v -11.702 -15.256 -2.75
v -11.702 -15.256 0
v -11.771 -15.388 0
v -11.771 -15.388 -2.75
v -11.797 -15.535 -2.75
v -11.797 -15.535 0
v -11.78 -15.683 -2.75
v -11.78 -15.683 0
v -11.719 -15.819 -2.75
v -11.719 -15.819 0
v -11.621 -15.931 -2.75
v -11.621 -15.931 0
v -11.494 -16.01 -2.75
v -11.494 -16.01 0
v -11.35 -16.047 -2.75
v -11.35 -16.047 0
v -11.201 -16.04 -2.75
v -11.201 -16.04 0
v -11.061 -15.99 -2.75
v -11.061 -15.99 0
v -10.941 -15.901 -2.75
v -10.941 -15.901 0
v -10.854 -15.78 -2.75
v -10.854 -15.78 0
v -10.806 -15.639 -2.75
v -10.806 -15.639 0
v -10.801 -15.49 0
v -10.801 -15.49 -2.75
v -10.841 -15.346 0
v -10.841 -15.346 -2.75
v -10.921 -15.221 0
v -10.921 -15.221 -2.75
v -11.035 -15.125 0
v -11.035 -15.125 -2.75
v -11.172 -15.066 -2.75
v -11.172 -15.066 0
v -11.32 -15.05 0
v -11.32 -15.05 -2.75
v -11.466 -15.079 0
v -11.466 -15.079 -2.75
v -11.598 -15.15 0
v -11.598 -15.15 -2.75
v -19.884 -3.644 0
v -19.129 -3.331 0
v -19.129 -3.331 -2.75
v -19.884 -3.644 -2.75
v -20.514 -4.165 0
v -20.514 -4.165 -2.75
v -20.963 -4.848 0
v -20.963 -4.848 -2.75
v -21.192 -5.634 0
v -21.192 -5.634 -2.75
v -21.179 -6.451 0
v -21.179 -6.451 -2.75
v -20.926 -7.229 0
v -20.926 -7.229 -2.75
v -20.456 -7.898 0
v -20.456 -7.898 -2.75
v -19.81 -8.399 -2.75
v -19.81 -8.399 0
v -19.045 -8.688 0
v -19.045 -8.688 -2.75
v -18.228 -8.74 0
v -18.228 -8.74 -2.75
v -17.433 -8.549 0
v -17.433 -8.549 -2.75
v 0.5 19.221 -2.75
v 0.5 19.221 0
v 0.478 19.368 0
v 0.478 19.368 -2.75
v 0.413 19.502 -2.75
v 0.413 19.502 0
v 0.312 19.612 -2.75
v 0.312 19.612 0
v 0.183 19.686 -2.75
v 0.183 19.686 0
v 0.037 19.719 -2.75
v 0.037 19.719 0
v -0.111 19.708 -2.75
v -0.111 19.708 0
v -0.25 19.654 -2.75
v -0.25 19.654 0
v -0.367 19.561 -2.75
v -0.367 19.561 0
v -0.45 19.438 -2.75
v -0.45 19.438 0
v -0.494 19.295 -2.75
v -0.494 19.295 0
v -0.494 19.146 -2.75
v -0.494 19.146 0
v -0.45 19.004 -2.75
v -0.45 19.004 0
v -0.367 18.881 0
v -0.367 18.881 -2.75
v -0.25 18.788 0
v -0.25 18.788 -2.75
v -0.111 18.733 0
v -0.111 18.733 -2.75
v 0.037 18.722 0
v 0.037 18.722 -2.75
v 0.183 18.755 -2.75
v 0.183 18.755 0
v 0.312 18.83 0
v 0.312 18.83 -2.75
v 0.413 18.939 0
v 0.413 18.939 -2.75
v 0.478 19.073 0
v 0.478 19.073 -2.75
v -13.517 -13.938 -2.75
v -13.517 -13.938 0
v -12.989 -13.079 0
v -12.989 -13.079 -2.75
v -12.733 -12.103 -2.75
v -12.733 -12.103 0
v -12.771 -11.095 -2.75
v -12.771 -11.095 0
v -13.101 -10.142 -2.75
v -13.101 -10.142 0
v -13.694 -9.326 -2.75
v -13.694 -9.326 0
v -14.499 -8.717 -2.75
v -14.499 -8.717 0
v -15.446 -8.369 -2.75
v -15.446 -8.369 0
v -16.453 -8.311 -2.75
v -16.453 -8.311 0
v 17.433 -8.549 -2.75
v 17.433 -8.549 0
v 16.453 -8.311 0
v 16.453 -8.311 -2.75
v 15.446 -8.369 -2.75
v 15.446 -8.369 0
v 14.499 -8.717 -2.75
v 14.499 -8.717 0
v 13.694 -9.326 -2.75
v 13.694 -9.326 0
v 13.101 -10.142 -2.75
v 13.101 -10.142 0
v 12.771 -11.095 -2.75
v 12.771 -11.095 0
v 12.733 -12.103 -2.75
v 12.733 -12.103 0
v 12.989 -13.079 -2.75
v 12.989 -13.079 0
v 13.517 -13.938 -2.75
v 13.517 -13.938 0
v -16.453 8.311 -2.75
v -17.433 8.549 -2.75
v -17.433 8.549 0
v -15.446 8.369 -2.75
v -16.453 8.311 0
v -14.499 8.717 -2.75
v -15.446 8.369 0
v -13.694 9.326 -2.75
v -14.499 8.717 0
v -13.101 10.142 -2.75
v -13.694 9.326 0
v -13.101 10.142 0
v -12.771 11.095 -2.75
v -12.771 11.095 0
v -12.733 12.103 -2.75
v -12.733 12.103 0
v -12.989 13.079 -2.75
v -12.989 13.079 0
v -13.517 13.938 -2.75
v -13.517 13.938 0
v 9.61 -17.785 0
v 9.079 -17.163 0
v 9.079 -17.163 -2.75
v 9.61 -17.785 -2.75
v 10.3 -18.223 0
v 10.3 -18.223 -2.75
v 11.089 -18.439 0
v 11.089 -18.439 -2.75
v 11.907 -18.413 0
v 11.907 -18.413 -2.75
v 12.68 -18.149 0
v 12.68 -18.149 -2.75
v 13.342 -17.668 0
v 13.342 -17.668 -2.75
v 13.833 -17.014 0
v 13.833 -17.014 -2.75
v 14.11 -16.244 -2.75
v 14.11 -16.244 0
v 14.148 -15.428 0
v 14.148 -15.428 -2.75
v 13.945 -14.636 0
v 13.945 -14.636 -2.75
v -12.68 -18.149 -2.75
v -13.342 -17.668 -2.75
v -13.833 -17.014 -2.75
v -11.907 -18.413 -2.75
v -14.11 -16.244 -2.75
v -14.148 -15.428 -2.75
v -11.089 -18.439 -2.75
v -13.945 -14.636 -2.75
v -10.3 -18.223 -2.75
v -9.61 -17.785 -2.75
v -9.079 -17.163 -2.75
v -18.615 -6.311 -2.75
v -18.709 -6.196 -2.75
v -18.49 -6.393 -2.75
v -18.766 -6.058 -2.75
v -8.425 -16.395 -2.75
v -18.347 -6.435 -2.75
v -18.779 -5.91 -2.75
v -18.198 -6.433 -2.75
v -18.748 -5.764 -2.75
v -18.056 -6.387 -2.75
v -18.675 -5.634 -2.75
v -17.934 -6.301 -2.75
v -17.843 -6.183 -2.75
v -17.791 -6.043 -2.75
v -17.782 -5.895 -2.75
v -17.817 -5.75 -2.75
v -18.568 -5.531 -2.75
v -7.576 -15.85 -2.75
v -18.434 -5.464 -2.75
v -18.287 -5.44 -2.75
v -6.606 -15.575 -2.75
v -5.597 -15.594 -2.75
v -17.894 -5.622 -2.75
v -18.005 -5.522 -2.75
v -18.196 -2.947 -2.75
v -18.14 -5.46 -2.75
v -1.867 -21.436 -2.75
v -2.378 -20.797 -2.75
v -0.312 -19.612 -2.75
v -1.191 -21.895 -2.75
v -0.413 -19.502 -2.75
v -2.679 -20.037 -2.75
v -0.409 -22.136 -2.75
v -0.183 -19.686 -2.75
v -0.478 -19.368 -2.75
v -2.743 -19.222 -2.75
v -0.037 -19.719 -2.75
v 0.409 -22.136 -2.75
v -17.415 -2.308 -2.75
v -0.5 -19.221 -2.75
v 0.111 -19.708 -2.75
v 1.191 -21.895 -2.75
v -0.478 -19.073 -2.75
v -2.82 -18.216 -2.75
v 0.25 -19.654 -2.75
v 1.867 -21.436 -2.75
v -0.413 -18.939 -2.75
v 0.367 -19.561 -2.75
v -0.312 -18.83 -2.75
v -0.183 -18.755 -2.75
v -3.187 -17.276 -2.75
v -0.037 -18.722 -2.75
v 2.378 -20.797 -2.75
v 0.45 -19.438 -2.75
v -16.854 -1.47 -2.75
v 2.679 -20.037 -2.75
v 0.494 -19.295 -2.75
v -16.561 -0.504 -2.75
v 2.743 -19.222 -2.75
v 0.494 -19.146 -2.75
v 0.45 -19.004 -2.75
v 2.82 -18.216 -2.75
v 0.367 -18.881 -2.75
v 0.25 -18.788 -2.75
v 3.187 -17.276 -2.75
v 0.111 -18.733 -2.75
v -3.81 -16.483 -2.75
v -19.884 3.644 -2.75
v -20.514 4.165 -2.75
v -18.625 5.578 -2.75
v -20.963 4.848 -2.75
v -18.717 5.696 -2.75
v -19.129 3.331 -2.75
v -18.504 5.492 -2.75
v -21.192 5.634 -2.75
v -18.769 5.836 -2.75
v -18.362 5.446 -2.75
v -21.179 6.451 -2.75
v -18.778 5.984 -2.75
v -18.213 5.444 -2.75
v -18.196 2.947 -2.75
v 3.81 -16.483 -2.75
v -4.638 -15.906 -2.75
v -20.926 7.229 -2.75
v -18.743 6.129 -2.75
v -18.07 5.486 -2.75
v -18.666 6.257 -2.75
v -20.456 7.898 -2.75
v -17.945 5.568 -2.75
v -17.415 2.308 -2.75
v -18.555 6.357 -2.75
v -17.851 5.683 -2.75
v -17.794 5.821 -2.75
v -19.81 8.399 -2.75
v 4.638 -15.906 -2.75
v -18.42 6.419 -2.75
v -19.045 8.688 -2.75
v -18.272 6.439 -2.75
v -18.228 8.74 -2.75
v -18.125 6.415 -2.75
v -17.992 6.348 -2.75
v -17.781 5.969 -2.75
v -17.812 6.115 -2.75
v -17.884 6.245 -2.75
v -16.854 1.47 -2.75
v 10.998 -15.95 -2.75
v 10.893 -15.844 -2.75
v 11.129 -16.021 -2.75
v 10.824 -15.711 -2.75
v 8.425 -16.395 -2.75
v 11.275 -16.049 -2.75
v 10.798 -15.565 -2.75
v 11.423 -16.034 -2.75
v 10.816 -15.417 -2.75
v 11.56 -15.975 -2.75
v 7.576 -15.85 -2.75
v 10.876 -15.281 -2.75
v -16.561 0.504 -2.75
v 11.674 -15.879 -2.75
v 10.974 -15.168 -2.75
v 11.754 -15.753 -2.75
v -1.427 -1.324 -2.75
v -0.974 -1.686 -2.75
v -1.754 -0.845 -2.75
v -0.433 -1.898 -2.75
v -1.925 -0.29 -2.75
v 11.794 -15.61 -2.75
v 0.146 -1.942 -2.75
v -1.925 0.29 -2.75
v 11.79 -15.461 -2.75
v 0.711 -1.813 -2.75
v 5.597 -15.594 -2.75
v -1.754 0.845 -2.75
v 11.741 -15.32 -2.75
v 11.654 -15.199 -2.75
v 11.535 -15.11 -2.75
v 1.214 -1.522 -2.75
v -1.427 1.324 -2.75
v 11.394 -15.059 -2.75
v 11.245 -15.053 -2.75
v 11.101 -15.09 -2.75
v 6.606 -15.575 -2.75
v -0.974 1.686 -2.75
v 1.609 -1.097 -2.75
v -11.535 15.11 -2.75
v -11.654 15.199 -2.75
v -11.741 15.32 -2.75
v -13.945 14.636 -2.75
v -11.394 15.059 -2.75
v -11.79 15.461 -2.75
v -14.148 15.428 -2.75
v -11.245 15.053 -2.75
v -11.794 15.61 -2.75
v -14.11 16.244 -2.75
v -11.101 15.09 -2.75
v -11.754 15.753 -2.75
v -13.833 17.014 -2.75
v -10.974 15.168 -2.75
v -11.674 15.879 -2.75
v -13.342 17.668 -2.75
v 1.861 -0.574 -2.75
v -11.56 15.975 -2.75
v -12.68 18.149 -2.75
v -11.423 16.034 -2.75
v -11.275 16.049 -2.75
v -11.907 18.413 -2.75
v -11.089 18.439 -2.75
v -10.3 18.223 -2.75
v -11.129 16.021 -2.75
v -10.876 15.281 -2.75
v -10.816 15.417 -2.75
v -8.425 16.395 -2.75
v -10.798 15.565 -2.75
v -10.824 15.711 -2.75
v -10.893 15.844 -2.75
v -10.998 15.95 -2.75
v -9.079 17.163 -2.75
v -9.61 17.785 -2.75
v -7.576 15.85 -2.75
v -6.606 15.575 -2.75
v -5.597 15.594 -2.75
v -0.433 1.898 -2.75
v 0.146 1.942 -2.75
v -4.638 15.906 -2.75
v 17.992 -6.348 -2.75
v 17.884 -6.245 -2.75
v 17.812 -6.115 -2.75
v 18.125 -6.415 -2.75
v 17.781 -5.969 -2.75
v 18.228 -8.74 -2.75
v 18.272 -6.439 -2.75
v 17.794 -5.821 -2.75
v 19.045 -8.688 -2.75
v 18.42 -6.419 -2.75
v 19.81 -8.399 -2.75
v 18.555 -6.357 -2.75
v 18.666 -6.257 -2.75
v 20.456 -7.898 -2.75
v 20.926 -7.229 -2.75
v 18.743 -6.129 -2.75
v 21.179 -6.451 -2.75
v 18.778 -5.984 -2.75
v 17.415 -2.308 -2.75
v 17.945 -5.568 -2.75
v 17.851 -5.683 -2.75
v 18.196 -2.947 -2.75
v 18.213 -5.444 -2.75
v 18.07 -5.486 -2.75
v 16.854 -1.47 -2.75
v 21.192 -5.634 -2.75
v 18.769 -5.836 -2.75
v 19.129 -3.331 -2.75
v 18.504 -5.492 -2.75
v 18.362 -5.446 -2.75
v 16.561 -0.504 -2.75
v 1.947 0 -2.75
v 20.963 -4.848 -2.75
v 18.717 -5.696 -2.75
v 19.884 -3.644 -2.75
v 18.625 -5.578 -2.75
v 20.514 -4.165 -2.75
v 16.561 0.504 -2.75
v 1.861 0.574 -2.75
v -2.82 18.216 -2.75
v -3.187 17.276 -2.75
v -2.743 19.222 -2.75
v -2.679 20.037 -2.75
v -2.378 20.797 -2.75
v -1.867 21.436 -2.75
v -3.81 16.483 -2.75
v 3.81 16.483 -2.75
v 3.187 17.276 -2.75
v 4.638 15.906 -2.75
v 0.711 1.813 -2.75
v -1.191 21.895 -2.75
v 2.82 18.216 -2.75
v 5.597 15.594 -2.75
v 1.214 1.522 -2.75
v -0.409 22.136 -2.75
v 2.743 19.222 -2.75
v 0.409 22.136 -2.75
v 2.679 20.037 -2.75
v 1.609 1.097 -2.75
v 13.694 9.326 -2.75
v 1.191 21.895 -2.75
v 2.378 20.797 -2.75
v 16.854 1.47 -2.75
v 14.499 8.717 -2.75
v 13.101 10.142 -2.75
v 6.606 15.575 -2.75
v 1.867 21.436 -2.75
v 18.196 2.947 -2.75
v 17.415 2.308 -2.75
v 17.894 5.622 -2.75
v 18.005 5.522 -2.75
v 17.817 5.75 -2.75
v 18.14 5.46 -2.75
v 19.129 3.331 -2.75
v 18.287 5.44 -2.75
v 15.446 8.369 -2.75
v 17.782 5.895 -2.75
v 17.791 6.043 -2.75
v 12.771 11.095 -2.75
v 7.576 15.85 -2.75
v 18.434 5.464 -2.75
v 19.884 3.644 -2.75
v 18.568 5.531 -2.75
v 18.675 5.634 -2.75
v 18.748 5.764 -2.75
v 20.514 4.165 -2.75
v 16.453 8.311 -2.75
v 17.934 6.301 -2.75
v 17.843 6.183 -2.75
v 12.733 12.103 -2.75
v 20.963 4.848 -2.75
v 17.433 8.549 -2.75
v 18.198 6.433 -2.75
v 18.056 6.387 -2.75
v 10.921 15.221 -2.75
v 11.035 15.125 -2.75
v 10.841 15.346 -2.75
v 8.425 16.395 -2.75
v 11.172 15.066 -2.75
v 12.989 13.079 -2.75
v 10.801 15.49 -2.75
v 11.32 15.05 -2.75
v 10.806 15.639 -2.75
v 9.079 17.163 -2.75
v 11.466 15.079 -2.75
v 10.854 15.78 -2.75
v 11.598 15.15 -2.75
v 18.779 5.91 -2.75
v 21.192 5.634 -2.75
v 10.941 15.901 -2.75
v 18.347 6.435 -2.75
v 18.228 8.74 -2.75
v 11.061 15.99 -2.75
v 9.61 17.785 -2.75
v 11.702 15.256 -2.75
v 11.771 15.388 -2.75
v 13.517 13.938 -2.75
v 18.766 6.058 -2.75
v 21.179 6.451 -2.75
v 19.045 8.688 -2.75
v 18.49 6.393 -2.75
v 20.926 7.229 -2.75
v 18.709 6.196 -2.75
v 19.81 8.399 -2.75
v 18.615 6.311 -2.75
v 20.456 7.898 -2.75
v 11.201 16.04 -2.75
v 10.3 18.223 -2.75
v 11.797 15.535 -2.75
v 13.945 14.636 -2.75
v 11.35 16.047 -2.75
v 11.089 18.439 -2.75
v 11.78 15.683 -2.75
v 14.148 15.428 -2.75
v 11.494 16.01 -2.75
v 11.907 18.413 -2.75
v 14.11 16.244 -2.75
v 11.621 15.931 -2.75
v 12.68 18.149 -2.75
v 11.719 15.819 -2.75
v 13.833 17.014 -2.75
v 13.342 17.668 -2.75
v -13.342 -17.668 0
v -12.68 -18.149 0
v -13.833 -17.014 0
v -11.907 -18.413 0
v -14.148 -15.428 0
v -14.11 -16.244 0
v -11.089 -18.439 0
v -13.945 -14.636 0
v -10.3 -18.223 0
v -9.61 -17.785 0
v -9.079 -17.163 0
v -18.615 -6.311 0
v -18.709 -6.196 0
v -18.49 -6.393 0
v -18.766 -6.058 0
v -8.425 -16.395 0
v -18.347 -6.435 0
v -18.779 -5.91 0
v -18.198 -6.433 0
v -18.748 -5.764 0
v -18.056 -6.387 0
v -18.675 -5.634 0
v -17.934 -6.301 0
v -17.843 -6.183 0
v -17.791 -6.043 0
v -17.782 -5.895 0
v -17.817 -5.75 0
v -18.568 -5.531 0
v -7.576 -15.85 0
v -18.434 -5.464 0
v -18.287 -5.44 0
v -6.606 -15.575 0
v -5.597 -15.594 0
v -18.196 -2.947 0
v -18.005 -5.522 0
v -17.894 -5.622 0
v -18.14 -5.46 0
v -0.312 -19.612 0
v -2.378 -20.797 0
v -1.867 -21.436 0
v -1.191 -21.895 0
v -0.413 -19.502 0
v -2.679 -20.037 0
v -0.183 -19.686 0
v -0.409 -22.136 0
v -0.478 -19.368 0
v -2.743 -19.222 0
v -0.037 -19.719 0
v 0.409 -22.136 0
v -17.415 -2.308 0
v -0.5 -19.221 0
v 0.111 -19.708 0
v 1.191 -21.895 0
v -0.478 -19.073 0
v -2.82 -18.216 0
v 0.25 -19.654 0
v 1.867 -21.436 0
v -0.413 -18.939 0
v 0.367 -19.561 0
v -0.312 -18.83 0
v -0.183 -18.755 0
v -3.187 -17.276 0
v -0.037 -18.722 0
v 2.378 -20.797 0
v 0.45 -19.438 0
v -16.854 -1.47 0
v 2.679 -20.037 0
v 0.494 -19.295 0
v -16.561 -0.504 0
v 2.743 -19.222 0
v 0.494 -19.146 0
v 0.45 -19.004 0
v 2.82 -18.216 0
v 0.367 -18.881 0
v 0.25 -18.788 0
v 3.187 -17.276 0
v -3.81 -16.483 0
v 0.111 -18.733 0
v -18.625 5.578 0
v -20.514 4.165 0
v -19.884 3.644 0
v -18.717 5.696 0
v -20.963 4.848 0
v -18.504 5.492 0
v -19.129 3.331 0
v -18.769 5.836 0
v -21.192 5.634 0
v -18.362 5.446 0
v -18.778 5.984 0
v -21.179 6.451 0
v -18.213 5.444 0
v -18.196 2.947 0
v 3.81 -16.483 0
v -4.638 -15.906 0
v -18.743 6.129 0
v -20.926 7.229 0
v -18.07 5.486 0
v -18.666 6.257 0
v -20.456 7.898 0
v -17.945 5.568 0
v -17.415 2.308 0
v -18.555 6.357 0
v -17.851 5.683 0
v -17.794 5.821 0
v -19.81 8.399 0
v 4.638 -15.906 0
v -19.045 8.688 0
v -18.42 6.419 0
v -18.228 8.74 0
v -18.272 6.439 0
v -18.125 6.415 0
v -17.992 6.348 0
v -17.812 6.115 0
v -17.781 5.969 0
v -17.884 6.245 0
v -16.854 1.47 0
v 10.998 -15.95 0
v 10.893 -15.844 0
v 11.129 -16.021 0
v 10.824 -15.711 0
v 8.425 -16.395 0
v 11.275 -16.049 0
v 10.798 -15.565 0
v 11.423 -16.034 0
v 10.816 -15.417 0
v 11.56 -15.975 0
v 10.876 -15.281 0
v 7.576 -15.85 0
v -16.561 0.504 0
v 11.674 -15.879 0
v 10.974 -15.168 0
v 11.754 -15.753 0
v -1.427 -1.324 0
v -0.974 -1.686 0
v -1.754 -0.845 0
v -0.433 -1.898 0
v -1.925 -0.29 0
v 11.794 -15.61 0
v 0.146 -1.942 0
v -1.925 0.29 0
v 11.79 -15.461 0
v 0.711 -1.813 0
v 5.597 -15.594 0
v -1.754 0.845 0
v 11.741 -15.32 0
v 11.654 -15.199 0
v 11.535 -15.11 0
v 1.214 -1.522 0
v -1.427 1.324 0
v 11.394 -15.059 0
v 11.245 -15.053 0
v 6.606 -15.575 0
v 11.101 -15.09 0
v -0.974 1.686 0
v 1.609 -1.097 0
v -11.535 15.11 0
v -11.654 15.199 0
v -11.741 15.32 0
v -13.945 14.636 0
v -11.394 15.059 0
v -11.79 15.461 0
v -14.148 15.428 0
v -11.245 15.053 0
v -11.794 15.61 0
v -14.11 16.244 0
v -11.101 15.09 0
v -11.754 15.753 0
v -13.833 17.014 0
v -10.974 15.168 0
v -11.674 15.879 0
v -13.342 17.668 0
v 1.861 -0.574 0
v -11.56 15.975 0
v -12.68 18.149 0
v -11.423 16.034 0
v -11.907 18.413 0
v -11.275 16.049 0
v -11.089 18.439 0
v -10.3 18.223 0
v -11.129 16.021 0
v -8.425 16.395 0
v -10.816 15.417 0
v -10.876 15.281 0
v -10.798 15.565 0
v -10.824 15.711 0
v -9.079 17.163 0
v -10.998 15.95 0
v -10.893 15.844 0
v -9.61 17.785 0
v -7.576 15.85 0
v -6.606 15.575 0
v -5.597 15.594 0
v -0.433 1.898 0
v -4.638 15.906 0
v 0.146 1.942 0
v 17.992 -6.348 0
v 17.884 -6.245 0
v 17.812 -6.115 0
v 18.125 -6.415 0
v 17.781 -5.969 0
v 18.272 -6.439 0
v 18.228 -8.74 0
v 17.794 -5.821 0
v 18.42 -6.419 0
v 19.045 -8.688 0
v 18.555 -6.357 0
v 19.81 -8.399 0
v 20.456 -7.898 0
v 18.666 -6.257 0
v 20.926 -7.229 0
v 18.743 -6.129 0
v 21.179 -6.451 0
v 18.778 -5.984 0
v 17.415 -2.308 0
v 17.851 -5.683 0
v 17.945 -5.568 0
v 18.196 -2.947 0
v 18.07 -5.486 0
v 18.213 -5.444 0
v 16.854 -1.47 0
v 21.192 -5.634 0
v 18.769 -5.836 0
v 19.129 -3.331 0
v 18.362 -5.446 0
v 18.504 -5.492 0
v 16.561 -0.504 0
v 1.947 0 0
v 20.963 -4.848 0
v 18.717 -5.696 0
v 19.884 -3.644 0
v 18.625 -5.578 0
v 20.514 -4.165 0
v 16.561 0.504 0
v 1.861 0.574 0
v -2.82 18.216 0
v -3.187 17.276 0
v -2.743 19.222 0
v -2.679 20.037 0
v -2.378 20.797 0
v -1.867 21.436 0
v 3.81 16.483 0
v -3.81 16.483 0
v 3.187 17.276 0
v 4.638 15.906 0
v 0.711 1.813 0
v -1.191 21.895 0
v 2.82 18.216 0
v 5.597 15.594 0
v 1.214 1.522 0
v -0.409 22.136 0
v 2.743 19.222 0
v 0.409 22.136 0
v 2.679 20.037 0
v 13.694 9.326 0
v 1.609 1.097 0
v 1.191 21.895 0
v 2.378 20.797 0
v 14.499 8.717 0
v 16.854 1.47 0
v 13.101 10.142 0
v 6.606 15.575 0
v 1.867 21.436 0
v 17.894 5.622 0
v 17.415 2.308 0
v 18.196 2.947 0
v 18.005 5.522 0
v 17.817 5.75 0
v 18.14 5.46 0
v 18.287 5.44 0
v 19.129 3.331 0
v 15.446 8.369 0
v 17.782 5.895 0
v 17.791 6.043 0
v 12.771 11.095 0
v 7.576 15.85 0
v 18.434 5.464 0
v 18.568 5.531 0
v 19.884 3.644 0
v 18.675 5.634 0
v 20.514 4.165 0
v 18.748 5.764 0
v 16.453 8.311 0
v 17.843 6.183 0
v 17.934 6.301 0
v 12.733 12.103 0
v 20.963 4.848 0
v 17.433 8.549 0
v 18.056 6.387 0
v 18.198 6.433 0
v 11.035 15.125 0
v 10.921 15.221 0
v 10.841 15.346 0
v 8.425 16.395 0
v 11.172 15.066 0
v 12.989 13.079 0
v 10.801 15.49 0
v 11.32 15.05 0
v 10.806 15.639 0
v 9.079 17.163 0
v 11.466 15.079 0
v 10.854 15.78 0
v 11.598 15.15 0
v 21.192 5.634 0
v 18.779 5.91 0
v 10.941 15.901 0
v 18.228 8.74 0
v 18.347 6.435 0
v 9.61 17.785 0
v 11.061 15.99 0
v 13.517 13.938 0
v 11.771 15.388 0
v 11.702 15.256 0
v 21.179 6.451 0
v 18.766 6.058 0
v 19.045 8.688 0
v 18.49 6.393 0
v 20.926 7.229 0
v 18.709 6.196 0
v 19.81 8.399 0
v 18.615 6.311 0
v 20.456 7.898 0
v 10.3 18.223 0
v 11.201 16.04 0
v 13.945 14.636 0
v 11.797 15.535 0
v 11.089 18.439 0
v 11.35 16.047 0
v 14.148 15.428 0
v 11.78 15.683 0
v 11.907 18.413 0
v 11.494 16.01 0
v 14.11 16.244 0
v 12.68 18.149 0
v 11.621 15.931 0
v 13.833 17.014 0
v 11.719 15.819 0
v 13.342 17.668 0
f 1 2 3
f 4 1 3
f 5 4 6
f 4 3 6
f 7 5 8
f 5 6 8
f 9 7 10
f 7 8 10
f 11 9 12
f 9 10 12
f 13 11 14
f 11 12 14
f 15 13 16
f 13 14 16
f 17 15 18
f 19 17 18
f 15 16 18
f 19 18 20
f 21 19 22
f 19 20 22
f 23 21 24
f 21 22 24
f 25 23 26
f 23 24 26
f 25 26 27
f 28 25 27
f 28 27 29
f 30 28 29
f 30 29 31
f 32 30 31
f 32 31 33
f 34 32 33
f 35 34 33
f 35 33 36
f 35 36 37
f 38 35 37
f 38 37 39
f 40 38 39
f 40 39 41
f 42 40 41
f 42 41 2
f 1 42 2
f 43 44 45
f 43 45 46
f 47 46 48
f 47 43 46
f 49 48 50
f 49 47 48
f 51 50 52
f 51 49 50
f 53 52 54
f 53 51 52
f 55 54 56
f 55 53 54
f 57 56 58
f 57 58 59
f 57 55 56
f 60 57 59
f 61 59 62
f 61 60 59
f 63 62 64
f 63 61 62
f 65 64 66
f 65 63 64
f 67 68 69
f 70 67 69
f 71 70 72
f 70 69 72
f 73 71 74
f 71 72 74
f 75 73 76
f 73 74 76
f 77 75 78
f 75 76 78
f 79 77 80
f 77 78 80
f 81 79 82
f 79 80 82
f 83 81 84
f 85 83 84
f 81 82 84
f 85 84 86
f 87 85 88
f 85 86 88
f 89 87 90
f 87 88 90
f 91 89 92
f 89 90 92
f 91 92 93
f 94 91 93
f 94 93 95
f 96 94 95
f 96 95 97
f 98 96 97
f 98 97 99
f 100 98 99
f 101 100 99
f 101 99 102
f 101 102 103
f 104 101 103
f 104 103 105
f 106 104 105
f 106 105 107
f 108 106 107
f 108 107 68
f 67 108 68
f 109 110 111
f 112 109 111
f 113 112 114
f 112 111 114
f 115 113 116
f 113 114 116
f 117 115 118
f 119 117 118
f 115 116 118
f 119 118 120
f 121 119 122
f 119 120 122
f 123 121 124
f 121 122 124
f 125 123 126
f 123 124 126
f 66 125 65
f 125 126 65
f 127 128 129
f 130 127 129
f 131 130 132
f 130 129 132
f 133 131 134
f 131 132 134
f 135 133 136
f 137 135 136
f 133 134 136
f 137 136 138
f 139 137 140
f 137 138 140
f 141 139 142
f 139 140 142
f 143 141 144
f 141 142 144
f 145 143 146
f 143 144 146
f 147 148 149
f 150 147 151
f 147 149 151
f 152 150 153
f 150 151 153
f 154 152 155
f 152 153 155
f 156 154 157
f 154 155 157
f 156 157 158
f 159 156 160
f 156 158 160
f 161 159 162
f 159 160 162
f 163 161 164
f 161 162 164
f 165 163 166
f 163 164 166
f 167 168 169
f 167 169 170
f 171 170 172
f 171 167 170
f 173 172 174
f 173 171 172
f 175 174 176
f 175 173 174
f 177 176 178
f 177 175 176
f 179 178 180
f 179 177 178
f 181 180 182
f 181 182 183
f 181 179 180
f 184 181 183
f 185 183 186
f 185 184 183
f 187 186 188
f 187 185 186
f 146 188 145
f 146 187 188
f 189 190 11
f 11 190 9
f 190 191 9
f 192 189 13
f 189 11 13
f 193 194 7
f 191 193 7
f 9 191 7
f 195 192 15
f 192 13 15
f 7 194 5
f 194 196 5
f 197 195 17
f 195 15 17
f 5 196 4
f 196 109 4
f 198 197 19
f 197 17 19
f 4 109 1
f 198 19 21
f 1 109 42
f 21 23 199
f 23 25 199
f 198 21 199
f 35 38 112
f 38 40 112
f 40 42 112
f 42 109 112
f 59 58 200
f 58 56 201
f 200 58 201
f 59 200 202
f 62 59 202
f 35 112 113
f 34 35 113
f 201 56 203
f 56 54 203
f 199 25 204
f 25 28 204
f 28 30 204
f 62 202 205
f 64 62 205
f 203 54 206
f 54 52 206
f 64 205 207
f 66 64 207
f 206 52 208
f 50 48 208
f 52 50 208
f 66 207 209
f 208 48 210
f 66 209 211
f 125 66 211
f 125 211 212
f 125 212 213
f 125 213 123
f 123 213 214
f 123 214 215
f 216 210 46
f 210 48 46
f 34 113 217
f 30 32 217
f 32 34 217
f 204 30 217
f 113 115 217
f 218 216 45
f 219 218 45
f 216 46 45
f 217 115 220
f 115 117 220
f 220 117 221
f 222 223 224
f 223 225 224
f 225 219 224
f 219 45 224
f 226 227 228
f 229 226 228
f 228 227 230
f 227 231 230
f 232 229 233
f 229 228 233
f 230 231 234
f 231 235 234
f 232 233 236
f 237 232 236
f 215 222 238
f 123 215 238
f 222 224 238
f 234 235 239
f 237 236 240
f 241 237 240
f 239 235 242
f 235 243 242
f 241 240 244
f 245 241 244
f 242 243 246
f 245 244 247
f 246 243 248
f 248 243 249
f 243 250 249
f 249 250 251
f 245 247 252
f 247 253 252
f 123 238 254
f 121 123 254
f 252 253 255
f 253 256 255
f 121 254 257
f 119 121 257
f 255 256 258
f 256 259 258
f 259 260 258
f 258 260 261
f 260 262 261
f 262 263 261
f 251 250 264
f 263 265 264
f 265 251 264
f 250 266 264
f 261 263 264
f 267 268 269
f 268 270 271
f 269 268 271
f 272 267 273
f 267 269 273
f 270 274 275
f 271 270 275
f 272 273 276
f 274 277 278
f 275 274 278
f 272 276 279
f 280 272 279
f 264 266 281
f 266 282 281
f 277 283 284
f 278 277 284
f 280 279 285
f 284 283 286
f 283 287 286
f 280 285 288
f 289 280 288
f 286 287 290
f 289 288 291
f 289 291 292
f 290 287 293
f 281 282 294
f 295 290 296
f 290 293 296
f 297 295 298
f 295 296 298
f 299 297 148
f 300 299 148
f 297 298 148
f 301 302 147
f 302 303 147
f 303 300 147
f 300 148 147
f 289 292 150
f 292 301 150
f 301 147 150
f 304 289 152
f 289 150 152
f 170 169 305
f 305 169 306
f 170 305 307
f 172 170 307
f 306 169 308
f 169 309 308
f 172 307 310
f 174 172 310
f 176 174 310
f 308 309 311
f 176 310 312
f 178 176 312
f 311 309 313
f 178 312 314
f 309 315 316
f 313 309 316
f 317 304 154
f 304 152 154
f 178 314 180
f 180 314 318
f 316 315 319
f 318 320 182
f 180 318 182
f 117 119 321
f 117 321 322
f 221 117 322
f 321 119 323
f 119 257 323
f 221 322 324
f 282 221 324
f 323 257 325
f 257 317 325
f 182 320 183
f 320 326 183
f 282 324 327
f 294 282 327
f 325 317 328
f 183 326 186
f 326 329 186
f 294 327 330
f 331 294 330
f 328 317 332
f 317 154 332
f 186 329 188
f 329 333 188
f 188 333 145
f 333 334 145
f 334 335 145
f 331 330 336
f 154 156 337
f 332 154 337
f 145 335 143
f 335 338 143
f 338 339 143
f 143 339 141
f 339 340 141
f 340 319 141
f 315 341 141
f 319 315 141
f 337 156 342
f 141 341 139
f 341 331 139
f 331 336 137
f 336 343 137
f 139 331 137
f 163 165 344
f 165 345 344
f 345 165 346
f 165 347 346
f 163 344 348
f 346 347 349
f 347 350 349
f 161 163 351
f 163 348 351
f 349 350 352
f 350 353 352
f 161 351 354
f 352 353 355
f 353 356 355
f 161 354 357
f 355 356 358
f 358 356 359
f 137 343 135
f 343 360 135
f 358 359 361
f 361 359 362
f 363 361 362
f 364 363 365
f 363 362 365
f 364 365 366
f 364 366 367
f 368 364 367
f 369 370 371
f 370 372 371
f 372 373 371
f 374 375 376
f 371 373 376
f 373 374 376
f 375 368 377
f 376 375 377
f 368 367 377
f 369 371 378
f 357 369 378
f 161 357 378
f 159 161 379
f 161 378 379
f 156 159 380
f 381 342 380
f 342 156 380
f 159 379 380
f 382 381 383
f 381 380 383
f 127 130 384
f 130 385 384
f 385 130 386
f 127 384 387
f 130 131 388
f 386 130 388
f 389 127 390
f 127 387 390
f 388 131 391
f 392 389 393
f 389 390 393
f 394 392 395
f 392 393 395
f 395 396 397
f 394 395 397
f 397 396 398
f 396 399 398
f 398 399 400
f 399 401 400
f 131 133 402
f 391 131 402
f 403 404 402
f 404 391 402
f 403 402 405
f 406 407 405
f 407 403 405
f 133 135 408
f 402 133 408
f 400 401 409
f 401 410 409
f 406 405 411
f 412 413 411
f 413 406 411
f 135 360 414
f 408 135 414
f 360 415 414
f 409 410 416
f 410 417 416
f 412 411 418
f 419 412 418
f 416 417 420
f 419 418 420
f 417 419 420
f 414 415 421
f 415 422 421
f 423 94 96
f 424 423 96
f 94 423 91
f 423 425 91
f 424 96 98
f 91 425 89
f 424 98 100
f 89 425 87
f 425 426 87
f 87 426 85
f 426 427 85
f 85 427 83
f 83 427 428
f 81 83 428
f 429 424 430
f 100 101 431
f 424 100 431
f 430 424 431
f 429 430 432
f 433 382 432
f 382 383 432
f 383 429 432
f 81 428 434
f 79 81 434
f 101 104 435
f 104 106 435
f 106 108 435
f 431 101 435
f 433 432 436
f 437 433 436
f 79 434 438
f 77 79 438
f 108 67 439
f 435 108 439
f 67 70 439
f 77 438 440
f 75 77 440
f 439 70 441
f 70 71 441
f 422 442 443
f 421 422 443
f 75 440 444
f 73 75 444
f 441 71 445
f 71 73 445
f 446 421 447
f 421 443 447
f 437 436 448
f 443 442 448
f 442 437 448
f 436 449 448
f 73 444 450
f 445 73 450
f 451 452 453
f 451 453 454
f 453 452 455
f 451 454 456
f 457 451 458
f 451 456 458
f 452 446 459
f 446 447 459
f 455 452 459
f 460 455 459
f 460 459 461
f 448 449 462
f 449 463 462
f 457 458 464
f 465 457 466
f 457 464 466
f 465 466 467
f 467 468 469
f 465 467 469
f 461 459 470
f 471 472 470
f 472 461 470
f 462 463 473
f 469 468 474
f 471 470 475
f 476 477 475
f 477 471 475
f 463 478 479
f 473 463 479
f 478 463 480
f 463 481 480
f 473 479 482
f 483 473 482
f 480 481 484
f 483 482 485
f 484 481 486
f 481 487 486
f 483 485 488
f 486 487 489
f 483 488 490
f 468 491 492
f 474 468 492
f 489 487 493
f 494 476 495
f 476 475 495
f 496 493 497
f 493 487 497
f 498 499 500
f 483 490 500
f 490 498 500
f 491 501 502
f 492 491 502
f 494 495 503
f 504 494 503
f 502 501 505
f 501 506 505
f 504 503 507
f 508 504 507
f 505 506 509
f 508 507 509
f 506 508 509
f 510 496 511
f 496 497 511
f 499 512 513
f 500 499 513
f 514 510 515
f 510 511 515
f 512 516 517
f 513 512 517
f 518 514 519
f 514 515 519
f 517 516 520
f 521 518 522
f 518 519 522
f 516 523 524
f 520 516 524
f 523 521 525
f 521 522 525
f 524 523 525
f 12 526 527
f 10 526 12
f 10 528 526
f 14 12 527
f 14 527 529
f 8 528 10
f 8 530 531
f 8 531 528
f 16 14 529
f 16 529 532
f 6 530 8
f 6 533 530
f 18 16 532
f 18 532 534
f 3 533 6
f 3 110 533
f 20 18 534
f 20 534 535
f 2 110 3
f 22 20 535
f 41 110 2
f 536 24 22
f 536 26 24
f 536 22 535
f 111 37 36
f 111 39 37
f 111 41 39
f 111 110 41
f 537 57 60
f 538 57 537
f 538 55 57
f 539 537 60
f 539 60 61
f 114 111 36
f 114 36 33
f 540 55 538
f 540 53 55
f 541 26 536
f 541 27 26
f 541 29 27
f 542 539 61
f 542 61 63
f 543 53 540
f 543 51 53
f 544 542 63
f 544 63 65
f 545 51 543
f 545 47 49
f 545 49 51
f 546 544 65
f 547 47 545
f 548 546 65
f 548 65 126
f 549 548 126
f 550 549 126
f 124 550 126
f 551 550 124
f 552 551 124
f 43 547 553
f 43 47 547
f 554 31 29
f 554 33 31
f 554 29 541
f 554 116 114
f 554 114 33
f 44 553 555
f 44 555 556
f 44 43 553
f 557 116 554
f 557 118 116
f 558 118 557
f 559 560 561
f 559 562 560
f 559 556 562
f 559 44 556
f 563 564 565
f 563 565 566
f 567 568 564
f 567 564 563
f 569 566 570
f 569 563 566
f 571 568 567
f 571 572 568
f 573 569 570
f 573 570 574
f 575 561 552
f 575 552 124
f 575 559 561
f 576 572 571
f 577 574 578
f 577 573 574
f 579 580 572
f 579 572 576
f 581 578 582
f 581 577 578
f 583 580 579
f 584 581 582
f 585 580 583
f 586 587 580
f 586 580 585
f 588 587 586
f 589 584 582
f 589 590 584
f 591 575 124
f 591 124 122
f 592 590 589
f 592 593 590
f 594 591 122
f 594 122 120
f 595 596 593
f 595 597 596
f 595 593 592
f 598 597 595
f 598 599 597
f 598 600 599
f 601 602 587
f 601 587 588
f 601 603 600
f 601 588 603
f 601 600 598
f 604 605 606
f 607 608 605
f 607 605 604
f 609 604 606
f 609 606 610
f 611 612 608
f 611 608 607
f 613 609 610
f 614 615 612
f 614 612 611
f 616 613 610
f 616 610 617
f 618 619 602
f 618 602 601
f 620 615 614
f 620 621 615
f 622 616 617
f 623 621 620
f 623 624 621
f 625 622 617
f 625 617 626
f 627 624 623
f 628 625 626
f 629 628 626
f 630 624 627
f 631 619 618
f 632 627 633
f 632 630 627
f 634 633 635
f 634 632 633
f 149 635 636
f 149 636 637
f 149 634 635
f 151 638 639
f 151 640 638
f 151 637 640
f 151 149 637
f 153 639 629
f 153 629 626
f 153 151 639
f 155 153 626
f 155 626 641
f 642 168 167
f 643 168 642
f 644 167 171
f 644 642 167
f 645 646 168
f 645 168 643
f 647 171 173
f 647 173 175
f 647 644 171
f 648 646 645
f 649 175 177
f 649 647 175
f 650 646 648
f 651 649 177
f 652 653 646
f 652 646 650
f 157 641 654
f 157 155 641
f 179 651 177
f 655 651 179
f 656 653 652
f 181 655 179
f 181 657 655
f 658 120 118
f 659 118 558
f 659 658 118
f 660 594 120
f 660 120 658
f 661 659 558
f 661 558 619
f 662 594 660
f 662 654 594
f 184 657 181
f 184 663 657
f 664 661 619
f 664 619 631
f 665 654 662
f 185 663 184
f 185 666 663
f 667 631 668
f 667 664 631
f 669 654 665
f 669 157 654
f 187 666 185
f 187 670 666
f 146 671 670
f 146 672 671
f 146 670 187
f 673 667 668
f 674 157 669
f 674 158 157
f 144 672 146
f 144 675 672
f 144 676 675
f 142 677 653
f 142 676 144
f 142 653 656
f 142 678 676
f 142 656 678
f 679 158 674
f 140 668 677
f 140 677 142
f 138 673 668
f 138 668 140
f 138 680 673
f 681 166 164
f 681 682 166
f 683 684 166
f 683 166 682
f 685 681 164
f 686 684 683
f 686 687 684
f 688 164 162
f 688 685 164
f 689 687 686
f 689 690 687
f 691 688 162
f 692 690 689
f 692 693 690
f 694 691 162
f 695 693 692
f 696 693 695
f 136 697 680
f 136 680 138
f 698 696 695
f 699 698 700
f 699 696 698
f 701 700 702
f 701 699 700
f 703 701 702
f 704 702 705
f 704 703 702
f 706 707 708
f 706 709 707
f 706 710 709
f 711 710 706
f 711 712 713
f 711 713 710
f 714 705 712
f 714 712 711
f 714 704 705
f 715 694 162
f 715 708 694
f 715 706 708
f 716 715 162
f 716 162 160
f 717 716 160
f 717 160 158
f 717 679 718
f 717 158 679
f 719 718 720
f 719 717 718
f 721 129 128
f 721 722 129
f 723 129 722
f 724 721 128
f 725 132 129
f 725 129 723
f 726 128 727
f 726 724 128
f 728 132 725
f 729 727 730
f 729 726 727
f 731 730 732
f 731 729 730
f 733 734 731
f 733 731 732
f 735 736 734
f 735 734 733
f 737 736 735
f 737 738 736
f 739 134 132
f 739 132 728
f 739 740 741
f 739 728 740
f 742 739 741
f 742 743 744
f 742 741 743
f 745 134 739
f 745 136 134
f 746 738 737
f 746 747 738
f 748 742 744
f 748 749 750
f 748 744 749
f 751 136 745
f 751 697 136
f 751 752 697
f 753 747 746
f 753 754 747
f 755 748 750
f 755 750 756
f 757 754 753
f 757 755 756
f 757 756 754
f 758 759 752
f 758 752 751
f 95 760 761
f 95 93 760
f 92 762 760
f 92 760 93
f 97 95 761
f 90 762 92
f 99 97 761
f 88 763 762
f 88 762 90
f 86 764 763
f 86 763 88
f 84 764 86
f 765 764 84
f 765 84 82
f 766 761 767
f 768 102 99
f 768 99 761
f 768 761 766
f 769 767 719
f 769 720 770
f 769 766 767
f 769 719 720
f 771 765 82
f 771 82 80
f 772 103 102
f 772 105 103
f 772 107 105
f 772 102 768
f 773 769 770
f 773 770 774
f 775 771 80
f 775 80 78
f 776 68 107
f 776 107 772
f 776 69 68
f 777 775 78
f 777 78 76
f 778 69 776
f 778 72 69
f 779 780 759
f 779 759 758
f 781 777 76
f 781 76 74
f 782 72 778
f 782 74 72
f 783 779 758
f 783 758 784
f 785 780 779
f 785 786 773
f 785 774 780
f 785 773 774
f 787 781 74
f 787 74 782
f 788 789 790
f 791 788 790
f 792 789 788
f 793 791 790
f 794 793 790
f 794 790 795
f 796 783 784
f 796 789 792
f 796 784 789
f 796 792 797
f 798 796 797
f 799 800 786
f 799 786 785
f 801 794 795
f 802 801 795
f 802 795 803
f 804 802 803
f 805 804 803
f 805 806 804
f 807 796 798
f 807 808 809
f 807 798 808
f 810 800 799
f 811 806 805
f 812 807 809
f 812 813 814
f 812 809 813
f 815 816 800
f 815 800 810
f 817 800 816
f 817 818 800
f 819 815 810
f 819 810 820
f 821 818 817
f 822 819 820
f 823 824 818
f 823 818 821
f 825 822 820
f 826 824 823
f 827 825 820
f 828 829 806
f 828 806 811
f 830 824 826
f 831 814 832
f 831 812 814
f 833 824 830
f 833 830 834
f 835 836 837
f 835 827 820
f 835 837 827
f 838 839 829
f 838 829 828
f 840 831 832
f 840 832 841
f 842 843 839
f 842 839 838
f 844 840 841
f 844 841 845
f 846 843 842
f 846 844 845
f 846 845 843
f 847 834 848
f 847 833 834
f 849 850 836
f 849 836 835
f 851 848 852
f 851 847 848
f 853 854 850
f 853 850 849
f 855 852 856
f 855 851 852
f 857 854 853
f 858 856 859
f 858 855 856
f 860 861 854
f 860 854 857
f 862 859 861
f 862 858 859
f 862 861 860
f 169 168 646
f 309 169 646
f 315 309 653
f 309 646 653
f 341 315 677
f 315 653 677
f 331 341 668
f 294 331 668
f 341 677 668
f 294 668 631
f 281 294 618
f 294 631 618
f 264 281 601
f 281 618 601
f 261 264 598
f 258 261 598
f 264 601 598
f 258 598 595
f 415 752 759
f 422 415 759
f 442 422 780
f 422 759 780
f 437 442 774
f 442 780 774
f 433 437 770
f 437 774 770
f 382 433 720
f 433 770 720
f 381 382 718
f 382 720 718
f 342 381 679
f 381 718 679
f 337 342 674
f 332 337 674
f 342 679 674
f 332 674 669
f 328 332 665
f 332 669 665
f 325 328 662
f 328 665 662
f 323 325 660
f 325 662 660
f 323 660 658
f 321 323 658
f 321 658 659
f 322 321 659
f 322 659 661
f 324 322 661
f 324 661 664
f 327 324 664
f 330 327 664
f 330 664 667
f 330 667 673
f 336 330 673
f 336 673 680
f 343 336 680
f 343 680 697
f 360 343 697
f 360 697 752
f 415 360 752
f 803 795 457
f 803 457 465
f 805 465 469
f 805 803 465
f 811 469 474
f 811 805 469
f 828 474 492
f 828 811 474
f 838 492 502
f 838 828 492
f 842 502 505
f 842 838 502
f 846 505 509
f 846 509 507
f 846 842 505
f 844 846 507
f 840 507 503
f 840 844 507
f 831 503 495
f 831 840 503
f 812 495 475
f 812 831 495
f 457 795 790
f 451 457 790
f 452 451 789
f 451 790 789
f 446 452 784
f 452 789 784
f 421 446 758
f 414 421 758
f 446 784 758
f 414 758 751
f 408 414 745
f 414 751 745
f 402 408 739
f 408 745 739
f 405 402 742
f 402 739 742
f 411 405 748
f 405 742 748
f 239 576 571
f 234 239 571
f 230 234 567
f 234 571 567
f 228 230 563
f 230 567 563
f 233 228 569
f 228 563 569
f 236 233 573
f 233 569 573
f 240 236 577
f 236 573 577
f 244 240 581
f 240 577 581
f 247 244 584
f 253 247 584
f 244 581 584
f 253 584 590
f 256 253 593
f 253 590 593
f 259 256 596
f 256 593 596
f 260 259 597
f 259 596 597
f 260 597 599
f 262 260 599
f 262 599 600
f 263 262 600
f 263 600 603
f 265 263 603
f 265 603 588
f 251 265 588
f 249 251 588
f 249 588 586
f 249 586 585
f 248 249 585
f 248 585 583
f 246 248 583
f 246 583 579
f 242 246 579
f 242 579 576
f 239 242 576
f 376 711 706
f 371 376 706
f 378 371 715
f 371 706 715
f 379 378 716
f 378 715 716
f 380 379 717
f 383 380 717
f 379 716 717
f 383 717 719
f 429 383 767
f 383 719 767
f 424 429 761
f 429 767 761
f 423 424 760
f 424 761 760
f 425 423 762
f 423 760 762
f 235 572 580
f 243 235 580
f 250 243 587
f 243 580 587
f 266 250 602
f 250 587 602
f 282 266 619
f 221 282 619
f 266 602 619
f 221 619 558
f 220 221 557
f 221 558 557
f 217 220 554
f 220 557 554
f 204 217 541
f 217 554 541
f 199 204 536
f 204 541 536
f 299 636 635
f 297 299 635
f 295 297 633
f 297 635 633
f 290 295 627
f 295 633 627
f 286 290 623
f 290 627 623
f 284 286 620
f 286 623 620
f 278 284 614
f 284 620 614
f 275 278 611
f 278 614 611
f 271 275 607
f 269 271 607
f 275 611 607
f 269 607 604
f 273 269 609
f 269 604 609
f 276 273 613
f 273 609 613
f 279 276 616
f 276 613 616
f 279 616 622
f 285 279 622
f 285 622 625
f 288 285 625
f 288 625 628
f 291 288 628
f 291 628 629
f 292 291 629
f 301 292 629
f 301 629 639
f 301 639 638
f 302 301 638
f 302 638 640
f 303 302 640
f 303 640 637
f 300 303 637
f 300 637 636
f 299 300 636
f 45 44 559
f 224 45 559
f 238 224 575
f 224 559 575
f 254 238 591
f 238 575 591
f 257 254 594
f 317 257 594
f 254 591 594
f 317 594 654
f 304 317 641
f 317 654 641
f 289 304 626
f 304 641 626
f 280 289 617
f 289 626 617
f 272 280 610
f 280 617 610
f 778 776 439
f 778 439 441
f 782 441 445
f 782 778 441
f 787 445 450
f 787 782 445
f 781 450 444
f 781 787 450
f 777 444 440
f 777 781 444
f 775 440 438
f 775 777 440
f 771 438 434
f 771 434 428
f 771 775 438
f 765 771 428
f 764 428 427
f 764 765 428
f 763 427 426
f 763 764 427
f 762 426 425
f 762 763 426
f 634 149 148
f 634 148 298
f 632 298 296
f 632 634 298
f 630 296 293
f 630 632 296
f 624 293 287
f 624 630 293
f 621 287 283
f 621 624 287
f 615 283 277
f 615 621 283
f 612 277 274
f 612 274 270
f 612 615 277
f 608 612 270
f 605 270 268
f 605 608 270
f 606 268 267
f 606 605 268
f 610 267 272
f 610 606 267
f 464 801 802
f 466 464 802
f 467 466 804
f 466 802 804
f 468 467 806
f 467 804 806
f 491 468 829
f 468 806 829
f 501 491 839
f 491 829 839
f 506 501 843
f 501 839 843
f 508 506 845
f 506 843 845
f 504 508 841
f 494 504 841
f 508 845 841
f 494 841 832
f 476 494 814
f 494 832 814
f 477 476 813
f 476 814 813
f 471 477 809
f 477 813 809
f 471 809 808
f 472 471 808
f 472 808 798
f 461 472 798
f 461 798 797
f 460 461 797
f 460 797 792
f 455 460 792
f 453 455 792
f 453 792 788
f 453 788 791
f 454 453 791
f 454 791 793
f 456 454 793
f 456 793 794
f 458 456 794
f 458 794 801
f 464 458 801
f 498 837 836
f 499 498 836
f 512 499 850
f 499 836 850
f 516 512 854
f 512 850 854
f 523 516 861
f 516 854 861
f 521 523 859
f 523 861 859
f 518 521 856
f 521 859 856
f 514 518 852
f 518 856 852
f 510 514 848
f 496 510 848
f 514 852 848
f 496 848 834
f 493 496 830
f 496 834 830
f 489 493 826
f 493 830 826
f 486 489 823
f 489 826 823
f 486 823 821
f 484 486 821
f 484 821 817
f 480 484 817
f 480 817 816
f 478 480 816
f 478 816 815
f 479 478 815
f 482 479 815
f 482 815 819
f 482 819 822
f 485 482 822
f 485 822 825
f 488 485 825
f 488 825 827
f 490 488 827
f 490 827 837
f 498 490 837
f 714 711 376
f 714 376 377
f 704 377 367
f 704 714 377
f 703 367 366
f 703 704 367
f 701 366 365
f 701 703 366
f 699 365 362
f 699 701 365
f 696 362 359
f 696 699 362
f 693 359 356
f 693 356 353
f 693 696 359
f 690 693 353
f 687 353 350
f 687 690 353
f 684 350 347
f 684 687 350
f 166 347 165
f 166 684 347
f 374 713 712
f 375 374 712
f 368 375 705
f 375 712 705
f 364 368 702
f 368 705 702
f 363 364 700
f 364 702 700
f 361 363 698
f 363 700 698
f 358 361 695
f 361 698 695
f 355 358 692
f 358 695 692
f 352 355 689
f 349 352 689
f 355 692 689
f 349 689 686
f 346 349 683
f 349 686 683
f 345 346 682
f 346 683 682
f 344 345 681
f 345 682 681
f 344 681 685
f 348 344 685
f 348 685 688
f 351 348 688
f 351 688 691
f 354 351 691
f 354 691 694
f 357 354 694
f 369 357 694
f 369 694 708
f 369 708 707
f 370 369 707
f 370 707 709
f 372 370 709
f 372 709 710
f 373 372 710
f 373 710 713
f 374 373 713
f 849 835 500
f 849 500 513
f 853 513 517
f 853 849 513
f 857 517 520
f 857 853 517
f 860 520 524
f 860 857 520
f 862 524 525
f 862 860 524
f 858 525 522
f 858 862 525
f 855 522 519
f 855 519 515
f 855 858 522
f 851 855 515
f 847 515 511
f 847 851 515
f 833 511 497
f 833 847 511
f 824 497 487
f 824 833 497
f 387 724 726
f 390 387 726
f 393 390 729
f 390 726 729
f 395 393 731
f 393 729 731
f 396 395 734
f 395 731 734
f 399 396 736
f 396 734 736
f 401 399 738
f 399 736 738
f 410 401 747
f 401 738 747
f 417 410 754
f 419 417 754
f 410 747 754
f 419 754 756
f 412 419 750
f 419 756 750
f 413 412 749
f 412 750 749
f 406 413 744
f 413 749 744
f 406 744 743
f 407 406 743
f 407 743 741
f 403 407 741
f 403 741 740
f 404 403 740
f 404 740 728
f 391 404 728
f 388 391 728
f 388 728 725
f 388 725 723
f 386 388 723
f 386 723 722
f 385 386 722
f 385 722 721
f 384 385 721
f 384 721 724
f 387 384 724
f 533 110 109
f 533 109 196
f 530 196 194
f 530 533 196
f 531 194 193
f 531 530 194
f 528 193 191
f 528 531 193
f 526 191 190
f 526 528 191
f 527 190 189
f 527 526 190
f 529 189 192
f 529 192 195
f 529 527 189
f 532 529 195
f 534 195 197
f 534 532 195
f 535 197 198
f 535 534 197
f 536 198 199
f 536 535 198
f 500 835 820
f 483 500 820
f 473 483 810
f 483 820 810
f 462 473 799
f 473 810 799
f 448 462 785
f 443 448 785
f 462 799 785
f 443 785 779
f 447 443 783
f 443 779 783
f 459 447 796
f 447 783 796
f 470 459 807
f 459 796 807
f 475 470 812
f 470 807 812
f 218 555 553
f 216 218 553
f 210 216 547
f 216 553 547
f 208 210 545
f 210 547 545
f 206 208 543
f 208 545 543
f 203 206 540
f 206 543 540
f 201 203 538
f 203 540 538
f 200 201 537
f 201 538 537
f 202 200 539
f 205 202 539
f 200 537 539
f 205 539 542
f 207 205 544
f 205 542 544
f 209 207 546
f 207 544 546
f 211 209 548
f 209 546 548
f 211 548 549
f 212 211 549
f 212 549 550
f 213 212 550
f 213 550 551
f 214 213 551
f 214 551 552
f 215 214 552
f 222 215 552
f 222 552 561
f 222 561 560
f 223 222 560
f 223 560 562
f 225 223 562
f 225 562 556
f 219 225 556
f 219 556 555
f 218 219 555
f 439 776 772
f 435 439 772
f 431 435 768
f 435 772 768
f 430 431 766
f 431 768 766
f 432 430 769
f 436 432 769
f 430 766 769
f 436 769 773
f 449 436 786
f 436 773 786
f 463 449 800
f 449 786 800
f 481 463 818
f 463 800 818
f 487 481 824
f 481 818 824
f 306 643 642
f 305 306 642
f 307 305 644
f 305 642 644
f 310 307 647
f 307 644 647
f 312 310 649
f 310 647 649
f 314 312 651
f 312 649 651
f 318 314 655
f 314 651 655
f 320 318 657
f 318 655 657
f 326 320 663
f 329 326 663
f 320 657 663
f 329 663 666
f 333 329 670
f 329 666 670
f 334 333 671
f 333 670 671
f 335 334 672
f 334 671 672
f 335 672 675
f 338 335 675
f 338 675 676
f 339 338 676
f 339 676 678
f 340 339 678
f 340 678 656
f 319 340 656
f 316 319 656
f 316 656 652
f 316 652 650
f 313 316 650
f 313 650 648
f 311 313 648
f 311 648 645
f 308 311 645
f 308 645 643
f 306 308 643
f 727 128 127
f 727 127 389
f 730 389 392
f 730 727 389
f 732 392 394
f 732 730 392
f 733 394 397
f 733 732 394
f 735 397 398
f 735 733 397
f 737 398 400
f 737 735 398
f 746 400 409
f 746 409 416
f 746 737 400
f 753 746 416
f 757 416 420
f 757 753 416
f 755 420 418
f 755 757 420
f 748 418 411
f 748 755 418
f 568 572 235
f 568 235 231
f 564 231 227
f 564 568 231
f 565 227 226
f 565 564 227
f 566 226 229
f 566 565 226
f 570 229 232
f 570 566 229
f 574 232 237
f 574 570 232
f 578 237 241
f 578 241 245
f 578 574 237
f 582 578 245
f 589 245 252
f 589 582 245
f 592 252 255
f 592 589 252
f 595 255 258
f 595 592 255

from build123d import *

# Parameters (mm, degrees)
F0_R            = 19.416407865
F1_DEPTH        = 2.75
F3_DEPTH        = 2.75
F3_COPIES_COUNT = 10
F5_DEPTH        = 25
F5_COPIES_COUNT = 10
F6_R            = 1.9472144129
F7_DEPTH        = 25
F8_R            = 0.5
F9_DEPTH        = 25
F9_COPIES_COUNT = 10


# Not quite as in the source:
# - a pattern or mirror of a feature is missing from the dataset's text; its kind, count and spacing are read off the source's solid


with BuildPart() as f1:
    # F0 (on Top) → F1 (new body)
    with BuildSketch(Plane.XY):
        Circle(F0_R)
    extrude(amount=-F1_DEPTH)

    # F2 (on face) → F3 (join)
    with BuildSketch(Plane.XY):
        with BuildLine():
            ThreePointArc((-2.7430957606, 19.22166278), (0, 19.416407865), (2.7430957606, 19.22166278))
            ThreePointArc((2.7430957606, 19.22166278), (0, 22.166407865), (-2.7430957606, 19.22166278))
        make_face()
    f3 = extrude(amount=-F3_DEPTH)

    # F3_copies: F3 ×10 about axis
    f3_copies_axis = Axis((0, 0, 0), (0, 0, 1))
    for i in range(1, F3_COPIES_COUNT):
        add(f3.rotate(f3_copies_axis, i * 360 / F3_COPIES_COUNT))

    # F4 (on face) → F5 (cut)
    with BuildSketch(Plane.XY):
        with BuildLine():
            Line((-6.2381998898, 19.1992051025), (-9.0789988191, 17.1630030829))
            ThreePointArc((-9.0789988191, 17.1630030829), (-5.1059656467, 15.7145464123), (-2.7430957606, 19.22166278))
            Line((-2.7430957606, 19.22166278), (-6.2381998898, 19.1992051025))
        make_face()
    f5 = extrude(amount=-F5_DEPTH, mode=Mode.SUBTRACT)

    # F5_copies: F5 ×10 about axis
    f5_copies_axis = Axis((0, 0, 0), (0, 0, 1))
    for i in range(1, F5_COPIES_COUNT):
        add(f5.rotate(f5_copies_axis, i * 360 / F5_COPIES_COUNT), mode=Mode.SUBTRACT)

    # F6 (on face) → F7 (cut)
    with BuildSketch(Plane.XY):
        Circle(F6_R)
    extrude(amount=-F7_DEPTH, mode=Mode.SUBTRACT)

    # F8 (on face) → F9 (cut)
    with BuildSketch(Plane.XY):
        with Locations((0, 19.2206762207)):
            Circle(F8_R)
    f9 = extrude(amount=-F9_DEPTH, mode=Mode.SUBTRACT)

    # F9_copies: F9 ×10 about axis
    f9_copies_axis = Axis((0, 0, 0), (0, 0, 1))
    for i in range(1, F9_COPIES_COUNT):
        add(f9.rotate(f9_copies_axis, i * 360 / F9_COPIES_COUNT), mode=Mode.SUBTRACT)


solid = f1.part
